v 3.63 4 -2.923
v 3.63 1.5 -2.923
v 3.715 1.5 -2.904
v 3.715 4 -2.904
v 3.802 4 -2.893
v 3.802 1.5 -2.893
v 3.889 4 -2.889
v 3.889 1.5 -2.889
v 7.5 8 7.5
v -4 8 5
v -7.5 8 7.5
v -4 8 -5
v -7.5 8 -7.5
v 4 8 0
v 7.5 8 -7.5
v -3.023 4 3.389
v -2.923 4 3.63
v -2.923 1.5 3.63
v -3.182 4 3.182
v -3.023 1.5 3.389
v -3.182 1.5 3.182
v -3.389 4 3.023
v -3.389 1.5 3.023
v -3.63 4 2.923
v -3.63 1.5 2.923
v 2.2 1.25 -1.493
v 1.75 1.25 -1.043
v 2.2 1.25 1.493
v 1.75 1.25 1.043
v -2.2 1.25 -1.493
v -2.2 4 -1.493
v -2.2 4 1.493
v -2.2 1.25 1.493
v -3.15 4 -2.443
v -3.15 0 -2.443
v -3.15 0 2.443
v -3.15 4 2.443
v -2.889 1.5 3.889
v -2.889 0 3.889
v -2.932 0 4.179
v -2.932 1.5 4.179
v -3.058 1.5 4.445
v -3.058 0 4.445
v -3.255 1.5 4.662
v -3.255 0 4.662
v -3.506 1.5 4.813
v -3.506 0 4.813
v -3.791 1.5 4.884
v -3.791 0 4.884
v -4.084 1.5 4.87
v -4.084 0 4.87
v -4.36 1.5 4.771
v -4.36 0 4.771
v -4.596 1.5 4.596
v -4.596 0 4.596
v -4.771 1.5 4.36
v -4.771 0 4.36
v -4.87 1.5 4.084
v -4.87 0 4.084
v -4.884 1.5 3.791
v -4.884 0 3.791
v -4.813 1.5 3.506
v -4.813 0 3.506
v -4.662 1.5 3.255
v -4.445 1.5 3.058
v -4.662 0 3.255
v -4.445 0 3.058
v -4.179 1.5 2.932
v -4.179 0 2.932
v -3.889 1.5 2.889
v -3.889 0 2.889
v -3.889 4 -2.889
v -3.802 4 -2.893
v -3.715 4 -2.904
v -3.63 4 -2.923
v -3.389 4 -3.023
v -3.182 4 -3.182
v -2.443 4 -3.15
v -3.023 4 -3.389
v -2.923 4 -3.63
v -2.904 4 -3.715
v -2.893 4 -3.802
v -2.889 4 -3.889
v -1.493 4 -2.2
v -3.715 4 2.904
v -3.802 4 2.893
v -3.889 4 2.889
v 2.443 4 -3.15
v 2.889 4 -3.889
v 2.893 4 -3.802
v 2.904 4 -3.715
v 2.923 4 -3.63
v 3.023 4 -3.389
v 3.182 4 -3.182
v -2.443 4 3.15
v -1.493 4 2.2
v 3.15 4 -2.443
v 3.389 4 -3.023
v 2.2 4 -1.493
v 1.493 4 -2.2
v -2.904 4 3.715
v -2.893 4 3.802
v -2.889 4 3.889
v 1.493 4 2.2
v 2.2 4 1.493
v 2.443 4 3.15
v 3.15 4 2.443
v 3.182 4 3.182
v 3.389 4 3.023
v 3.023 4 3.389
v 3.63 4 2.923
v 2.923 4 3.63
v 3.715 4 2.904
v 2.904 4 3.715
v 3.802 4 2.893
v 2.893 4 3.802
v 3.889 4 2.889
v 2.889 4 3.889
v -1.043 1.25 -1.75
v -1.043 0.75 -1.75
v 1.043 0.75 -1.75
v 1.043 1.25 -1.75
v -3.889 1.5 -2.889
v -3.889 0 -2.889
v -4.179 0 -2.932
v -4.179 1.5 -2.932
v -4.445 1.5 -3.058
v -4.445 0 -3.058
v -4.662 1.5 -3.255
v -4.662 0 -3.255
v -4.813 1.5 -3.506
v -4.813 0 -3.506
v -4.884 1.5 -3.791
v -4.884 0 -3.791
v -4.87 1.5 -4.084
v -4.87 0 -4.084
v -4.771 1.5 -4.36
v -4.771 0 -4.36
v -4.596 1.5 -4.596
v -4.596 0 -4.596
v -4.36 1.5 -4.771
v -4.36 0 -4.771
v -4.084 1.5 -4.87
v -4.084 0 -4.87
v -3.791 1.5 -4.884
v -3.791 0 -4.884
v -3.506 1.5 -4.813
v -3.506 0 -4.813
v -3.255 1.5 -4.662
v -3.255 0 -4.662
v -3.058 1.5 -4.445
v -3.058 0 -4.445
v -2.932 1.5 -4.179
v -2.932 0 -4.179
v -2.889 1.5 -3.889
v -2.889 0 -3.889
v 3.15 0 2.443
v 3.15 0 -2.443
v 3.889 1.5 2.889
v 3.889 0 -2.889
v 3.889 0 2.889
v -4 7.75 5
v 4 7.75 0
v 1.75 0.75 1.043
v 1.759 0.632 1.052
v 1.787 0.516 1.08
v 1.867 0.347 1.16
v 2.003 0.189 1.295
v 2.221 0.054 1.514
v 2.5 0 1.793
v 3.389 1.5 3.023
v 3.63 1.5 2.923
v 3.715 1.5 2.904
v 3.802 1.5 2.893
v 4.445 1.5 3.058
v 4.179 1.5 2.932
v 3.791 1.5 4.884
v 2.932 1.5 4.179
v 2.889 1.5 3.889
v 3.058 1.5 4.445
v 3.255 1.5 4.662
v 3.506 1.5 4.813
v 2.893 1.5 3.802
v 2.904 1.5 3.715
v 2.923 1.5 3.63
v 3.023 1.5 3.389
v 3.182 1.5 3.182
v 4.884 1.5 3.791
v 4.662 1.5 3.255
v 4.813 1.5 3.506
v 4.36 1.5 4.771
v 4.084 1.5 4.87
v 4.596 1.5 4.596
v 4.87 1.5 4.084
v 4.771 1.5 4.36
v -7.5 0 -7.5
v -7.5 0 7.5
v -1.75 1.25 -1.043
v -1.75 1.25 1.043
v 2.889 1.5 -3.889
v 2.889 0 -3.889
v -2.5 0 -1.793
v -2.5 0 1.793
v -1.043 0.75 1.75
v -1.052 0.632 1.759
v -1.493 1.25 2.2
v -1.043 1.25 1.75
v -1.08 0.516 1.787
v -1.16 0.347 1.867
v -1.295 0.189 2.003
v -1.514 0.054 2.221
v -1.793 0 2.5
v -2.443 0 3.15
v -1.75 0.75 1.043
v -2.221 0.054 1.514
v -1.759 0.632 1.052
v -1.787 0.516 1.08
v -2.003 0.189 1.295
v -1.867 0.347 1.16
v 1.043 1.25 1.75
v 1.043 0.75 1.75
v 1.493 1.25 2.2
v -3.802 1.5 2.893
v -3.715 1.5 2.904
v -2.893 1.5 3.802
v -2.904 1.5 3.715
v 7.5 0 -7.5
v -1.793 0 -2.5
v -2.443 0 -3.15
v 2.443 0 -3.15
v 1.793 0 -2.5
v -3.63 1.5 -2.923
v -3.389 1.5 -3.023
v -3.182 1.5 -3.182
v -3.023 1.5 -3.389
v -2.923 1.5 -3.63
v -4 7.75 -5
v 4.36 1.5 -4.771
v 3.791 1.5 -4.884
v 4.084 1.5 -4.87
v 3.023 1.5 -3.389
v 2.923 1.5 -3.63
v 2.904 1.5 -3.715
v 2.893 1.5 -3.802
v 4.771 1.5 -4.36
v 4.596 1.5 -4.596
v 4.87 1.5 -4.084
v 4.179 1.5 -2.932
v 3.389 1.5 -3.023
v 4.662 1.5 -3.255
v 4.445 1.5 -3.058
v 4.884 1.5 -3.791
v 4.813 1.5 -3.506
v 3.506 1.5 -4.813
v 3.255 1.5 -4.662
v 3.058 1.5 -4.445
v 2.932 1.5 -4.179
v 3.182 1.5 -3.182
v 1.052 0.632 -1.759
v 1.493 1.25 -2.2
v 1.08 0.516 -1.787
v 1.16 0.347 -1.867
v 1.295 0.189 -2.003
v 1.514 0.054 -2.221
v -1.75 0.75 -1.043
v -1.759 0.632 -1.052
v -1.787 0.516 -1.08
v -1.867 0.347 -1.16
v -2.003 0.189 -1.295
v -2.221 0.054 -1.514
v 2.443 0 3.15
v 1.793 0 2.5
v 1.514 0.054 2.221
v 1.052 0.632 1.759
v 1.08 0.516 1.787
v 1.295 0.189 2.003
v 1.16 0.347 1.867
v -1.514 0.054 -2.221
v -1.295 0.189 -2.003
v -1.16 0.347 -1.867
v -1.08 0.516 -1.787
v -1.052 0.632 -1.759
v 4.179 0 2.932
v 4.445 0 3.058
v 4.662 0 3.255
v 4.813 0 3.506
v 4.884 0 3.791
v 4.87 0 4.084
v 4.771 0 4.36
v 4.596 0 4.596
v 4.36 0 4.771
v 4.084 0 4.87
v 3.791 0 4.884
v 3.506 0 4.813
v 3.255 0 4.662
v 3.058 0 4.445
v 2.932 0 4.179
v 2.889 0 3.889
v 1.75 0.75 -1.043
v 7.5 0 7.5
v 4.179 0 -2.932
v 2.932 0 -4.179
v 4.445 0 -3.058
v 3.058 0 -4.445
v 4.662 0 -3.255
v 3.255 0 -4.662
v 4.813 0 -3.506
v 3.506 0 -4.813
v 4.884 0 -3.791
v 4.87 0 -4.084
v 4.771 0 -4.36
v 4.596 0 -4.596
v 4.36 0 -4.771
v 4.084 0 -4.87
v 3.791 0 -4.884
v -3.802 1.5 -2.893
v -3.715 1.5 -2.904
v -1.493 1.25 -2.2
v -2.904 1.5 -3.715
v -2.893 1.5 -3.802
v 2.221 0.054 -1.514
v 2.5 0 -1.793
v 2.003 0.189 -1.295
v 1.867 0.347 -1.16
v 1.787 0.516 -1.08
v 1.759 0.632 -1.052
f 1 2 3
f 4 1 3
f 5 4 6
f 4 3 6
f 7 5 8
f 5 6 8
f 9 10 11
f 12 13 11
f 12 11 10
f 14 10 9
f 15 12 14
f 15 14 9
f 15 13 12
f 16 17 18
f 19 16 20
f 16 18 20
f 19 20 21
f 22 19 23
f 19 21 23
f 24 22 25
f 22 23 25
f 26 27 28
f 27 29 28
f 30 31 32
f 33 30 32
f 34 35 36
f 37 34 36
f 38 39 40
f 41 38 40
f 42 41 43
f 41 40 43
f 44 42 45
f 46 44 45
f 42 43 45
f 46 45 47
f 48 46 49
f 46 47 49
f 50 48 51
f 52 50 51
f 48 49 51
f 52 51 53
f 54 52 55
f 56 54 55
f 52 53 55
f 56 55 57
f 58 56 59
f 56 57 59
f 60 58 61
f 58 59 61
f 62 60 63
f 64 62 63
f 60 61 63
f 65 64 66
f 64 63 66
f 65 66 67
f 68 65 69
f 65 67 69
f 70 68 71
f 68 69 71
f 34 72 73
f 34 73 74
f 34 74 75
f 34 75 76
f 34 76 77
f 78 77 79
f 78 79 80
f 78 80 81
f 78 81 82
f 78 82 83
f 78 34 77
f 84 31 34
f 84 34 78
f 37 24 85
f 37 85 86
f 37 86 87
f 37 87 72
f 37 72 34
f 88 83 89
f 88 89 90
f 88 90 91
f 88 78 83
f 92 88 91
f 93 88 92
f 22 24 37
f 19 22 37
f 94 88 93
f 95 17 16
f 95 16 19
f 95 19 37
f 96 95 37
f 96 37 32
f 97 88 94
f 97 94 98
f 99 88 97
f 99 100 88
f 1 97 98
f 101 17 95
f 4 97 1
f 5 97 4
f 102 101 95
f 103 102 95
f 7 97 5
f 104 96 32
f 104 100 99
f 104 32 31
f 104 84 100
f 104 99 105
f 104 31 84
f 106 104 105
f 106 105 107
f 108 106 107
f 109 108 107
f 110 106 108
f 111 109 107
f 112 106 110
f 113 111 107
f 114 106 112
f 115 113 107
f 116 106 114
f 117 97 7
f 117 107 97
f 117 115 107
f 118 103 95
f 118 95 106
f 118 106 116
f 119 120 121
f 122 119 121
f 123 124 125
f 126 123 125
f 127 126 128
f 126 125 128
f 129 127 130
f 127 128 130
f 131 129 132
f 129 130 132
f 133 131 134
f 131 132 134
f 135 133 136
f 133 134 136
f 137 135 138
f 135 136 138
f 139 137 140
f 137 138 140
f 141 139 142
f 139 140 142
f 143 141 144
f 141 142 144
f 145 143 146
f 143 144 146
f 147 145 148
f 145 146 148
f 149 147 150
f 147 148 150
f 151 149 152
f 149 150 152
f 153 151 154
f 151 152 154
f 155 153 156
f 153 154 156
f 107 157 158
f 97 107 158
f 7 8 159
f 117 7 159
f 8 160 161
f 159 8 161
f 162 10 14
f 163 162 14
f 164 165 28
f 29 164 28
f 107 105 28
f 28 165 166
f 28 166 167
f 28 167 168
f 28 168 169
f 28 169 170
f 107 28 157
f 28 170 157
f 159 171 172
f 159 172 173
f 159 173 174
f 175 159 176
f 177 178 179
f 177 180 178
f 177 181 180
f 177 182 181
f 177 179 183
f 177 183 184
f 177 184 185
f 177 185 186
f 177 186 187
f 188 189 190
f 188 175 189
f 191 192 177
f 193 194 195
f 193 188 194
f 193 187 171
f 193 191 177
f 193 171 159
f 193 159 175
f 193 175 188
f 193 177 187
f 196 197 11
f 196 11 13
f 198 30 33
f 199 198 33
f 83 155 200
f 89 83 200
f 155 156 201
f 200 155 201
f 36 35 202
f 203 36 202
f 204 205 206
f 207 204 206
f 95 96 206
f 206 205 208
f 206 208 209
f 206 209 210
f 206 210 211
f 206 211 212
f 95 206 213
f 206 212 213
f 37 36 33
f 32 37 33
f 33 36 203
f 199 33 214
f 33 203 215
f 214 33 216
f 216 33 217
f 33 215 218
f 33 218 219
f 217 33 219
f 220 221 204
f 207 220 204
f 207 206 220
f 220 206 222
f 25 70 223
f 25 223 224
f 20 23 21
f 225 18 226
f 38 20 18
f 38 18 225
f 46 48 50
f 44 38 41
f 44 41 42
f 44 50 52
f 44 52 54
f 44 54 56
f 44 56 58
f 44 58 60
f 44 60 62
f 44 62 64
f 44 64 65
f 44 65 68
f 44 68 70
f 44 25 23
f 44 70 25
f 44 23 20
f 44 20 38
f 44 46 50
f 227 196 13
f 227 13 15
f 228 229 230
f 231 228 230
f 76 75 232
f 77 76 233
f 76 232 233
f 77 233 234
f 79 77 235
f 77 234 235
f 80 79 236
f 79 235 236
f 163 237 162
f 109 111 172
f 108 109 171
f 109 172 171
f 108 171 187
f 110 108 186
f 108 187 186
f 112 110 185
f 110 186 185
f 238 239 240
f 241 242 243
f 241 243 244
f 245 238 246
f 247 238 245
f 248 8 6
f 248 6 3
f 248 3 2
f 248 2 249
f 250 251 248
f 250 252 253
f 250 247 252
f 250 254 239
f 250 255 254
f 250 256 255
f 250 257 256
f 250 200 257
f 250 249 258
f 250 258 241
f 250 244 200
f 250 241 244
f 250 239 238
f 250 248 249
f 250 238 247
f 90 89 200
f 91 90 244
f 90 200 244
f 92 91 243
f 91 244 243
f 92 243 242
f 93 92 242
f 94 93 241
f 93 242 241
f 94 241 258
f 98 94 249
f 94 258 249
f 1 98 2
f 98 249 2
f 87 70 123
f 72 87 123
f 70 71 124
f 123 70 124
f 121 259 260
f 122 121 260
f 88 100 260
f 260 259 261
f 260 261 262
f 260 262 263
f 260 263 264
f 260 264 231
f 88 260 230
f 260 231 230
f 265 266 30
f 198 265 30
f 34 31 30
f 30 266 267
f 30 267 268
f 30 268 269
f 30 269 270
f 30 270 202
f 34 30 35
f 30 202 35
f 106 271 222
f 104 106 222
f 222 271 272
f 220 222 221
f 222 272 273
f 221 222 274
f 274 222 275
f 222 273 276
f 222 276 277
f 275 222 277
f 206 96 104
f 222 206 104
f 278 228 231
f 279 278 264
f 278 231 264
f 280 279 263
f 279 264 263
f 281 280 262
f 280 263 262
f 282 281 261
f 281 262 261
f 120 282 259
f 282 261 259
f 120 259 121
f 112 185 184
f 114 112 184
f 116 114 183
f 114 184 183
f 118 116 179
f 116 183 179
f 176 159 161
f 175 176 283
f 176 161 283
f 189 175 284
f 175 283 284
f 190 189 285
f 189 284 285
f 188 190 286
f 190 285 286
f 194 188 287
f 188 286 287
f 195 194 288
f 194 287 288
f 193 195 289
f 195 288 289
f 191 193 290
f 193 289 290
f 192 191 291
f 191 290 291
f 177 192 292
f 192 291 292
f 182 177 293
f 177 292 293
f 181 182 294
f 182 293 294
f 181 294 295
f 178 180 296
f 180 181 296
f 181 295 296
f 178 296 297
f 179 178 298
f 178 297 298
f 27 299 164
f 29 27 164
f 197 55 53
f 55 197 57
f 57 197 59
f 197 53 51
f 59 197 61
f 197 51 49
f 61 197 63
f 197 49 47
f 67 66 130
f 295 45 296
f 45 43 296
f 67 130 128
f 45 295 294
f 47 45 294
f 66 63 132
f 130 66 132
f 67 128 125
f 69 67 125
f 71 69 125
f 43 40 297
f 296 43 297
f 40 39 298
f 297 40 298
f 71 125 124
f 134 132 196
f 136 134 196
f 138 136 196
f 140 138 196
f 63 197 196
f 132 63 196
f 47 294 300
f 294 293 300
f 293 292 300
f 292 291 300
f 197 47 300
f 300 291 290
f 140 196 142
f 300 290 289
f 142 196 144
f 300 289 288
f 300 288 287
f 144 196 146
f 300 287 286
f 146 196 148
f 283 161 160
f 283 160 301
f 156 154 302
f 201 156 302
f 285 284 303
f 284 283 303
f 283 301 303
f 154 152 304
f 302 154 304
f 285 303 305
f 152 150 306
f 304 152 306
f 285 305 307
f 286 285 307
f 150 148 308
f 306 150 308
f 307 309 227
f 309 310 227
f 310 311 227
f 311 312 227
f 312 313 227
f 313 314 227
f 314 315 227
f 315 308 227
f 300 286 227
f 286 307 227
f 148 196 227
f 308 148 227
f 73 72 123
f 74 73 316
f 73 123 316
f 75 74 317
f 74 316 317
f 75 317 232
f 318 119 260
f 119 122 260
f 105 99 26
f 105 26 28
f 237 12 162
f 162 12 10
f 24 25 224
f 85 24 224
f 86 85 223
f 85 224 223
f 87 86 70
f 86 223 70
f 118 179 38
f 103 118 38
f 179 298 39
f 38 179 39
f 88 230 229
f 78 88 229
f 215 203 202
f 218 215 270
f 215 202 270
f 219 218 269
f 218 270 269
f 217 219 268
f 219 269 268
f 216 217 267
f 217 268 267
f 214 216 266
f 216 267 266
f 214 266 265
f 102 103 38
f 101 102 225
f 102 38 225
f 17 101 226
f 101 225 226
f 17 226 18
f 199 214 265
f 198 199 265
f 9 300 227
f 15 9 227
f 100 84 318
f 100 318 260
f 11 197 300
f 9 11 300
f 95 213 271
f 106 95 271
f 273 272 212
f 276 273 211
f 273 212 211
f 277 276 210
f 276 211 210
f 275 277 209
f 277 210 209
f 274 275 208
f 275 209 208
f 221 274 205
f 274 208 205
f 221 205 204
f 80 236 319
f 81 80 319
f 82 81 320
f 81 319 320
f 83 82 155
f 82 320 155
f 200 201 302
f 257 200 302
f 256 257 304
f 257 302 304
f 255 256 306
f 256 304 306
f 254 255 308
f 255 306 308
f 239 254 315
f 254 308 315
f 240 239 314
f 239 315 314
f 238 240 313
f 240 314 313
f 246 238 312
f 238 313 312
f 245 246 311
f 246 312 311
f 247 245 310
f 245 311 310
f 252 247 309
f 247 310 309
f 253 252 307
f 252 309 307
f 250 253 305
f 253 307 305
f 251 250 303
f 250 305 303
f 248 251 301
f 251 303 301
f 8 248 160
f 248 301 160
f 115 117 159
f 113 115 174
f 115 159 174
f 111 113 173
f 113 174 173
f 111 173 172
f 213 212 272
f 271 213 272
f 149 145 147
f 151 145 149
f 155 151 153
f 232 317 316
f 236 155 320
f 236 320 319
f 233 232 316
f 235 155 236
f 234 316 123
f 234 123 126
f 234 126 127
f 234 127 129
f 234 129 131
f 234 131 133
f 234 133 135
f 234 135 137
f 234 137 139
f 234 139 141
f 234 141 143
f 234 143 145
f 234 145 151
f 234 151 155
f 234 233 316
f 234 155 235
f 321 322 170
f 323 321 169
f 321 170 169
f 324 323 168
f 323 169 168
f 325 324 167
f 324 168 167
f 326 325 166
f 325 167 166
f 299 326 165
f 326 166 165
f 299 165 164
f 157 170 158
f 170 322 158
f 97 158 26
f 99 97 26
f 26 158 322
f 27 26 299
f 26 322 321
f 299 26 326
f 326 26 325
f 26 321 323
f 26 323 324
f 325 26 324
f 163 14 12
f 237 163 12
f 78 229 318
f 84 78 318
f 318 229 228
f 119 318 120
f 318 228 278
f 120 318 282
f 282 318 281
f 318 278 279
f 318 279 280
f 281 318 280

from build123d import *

# Parameters (mm, degrees)
SKETCH1_W           = 15
SKETCH1_H           = 15
BOSS_EXTRUDE1_DEPTH = 8
SKETCH2_R           = 1
CUT_EXTRUDE1_DEPTH  = 1.5
CUT_EXTRUDE2_DEPTH  = 4
SKETCH4_W           = 4.4
SKETCH4_H           = 4.4
CUT_EXTRUDE3_DEPTH  = 2.75
CUT_EXTRUDE4_DEPTH  = 0.25
FILLET1_R           = 0.75


with BuildPart() as part:
    # Sketch1 → Boss-Extrude1 (new body)
    with BuildSketch(Plane(origin=(0, 0, 0), x_dir=(1, 0, 0), z_dir=(0, 1, 0))):
        Rectangle(SKETCH1_W, SKETCH1_H)
    extrude(amount=BOSS_EXTRUDE1_DEPTH)

    # Sketch2 → Cut-Extrude1 (cut)
    with BuildSketch(Plane.XZ):
        with Locations((-3.889087297, 3.889087297)):
            Circle(SKETCH2_R)
        with Locations((3.889087297, -3.889087297)):
            Circle(SKETCH2_R)
        with Locations((-3.889087297, -3.889087297)):
            Circle(SKETCH2_R)
        with Locations((3.889087297, 3.889087297)):
            Circle(SKETCH2_R)
    extrude(amount=-CUT_EXTRUDE1_DEPTH, mode=Mode.SUBTRACT)

    # Sketch3 → Cut-Extrude2 (cut)
    with BuildSketch(Plane.XZ):
        Polygon((-0.707106781, 0), (-1.75, 1.042893219), (-1.75, -1.042893219), align=None)
        Polygon((-0.707106781, 0), (-1.75, -1.042893219), (-1.75, -1.75), (-1.042893219, -1.75), (0, -0.707106781), align=None)
        Polygon((1.042893219, -1.75), (0, -0.707106781), (-1.042893219, -1.75), align=None)
        Polygon((1.75, -1.042893219), (0.707106781, 0), (0, -0.707106781), (1.042893219, -1.75), (1.75, -1.75), align=None)
        Polygon((1.75, 1.042893219), (0.707106781, 0), (1.75, -1.042893219), align=None)
        Polygon((1.75, 1.75), (1.042893219, 1.75), (0, 0.707106781), (0.707106781, 0), (1.75, 1.042893219), align=None)
        Polygon((1.042893219, 1.75), (-1.042893219, 1.75), (0, 0.707106781), align=None)
        Polygon((0, 0.707106781), (-1.042893219, 1.75), (-1.75, 1.75), (-1.75, 1.042893219), (-0.707106781, 0), align=None)
        Polygon((0.707106781, 0), (0, 0.707106781), (-0.707106781, 0), (0, -0.707106781), align=None)
        Polygon((-2.442893219, 3.15), (-3.15, 3.15), (-3.15, 2.442893219), (-1.75, 1.042893219), (-1.75, 1.75), (-1.042893219, 1.75), align=None)
        Polygon((3.15, 3.15), (2.442893219, 3.15), (1.042893219, 1.75), (1.75, 1.75), (1.75, 1.042893219), (3.15, 2.442893219), align=None)
        Polygon((3.15, -3.15), (3.15, -2.442893219), (1.75, -1.042893219), (1.75, -1.75), (1.042893219, -1.75), (2.442893219, -3.15), align=None)
        Polygon((-1.75, -1.042893219), (-3.15, -2.442893219), (-3.15, -3.15), (-2.442893219, -3.15), (-1.042893219, -1.75), (-1.75, -1.75), align=None)
        with BuildLine():
            Line((-3.15, -2.442893219), (-3.15, 2.442893219))
            Line((-3.15, 2.442893219), (-3.630268251, 2.92316147))
            ThreePointArc((-3.630268251, 2.92316147), (-3.758561104, 2.897642435), (-3.889087297, 2.889087297))
            Line((-3.889087297, 2.889087297), (-3.889087297, -2.889087297))
            ThreePointArc((-3.889087297, -2.889087297), (-3.758561104, -2.897642435), (-3.630268251, -2.92316147))
            Line((-3.630268251, -2.92316147), (-3.15, -2.442893219))
        make_face()
        with BuildLine():
            Line((3.630268251, 2.92316147), (3.15, 2.442893219))
            Line((3.15, 2.442893219), (3.15, -2.442893219))
            Line((3.15, -2.442893219), (3.630268251, -2.92316147))
            ThreePointArc((3.630268251, -2.92316147), (3.758561104, -2.897642435), (3.889087297, -2.889087297))
            Line((3.889087297, -2.889087297), (3.889087297, 2.889087297))
            ThreePointArc((3.889087297, 2.889087297), (3.758561104, 2.897642435), (3.630268251, 2.92316147))
        make_face()
        with BuildLine():
            Line((2.92316147, 3.630268251), (2.442893219, 3.15))
            Line((2.442893219, 3.15), (3.15, 3.15))
            Line((3.15, 3.15), (3.15, 2.442893219))
            Line((3.15, 2.442893219), (3.630268251, 2.92316147))
            ThreePointArc((3.630268251, 2.92316147), (3.181980515, 3.181980515), (2.92316147, 3.630268251))
        make_face()
        with BuildLine():
            Line((-2.92316147, 3.630268251), (-2.442893219, 3.15))
            Line((-2.442893219, 3.15), (2.442893219, 3.15))
            Line((2.442893219, 3.15), (2.92316147, 3.630268251))
            ThreePointArc((2.92316147, 3.630268251), (2.897642435, 3.758561104), (2.889087297, 3.889087297))
            Line((2.889087297, 3.889087297), (-2.889087297, 3.889087297))
            ThreePointArc((-2.889087297, 3.889087297), (-2.897642435, 3.758561104), (-2.92316147, 3.630268251))
        make_face()
        with BuildLine():
            Line((-3.15, -3.15), (-3.15, -2.442893219))
            Line((-3.15, -2.442893219), (-3.630268251, -2.92316147))
            ThreePointArc((-3.630268251, -2.92316147), (-3.181980515, -3.181980515), (-2.92316147, -3.630268251))
            Line((-2.92316147, -3.630268251), (-2.442893219, -3.15))
            Line((-2.442893219, -3.15), (-3.15, -3.15))
        make_face()
        with BuildLine():
            Line((2.442893219, -3.15), (-2.442893219, -3.15))
            Line((-2.442893219, -3.15), (-2.92316147, -3.630268251))
            ThreePointArc((-2.92316147, -3.630268251), (-2.897642435, -3.758561104), (-2.889087297, -3.889087297))
            Line((-2.889087297, -3.889087297), (2.889087297, -3.889087297))
            ThreePointArc((2.889087297, -3.889087297), (2.897642435, -3.758561104), (2.92316147, -3.630268251))
            Line((2.92316147, -3.630268251), (2.442893219, -3.15))
        make_face()
        with BuildLine():
            Line((3.630268251, -2.92316147), (3.15, -2.442893219))
            Line((3.15, -2.442893219), (3.15, -3.15))
            Line((3.15, -3.15), (2.442893219, -3.15))
            Line((2.442893219, -3.15), (2.92316147, -3.630268251))
            ThreePointArc((2.92316147, -3.630268251), (3.181980515, -3.181980515), (3.630268251, -2.92316147))
        make_face()
        with BuildLine():
            Line((-3.15, 2.442893219), (-3.15, 3.15))
            Line((-3.15, 3.15), (-2.442893219, 3.15))
            Line((-2.442893219, 3.15), (-2.92316147, 3.630268251))
            ThreePointArc((-2.92316147, 3.630268251), (-3.181980515, 3.181980515), (-3.630268251, 2.92316147))
            Line((-3.630268251, 2.92316147), (-3.15, 2.442893219))
        make_face()
    extrude(amount=-CUT_EXTRUDE2_DEPTH, mode=Mode.SUBTRACT)

    # Sketch4 → Cut-Extrude3 (cut)
    with BuildSketch(Plane.XZ.offset(-4)):
        Rectangle(SKETCH4_W, SKETCH4_H)
    extrude(amount=CUT_EXTRUDE3_DEPTH, mode=Mode.SUBTRACT)

    # Sketch5 → Cut-Extrude4 (cut)
    with BuildSketch(Plane(origin=(0, 8, 0), x_dir=(1, 0, 0), z_dir=(0, 1, 0))):
        Polygon((4, 0), (-4, 5), (-4, -5), align=None)
    extrude(amount=-CUT_EXTRUDE4_DEPTH, mode=Mode.SUBTRACT)

    # Fillet1
    fillet1_edges = [part.edges().sort_by_distance(p)[0] for p in [
        (0, 0, 1.75),
        (1.75, 0, 0),
        (0, 0, -1.75),
        (-1.75, 0, 0),
    ]]
    fillet(fillet1_edges, radius=FILLET1_R)


solid = part.part
